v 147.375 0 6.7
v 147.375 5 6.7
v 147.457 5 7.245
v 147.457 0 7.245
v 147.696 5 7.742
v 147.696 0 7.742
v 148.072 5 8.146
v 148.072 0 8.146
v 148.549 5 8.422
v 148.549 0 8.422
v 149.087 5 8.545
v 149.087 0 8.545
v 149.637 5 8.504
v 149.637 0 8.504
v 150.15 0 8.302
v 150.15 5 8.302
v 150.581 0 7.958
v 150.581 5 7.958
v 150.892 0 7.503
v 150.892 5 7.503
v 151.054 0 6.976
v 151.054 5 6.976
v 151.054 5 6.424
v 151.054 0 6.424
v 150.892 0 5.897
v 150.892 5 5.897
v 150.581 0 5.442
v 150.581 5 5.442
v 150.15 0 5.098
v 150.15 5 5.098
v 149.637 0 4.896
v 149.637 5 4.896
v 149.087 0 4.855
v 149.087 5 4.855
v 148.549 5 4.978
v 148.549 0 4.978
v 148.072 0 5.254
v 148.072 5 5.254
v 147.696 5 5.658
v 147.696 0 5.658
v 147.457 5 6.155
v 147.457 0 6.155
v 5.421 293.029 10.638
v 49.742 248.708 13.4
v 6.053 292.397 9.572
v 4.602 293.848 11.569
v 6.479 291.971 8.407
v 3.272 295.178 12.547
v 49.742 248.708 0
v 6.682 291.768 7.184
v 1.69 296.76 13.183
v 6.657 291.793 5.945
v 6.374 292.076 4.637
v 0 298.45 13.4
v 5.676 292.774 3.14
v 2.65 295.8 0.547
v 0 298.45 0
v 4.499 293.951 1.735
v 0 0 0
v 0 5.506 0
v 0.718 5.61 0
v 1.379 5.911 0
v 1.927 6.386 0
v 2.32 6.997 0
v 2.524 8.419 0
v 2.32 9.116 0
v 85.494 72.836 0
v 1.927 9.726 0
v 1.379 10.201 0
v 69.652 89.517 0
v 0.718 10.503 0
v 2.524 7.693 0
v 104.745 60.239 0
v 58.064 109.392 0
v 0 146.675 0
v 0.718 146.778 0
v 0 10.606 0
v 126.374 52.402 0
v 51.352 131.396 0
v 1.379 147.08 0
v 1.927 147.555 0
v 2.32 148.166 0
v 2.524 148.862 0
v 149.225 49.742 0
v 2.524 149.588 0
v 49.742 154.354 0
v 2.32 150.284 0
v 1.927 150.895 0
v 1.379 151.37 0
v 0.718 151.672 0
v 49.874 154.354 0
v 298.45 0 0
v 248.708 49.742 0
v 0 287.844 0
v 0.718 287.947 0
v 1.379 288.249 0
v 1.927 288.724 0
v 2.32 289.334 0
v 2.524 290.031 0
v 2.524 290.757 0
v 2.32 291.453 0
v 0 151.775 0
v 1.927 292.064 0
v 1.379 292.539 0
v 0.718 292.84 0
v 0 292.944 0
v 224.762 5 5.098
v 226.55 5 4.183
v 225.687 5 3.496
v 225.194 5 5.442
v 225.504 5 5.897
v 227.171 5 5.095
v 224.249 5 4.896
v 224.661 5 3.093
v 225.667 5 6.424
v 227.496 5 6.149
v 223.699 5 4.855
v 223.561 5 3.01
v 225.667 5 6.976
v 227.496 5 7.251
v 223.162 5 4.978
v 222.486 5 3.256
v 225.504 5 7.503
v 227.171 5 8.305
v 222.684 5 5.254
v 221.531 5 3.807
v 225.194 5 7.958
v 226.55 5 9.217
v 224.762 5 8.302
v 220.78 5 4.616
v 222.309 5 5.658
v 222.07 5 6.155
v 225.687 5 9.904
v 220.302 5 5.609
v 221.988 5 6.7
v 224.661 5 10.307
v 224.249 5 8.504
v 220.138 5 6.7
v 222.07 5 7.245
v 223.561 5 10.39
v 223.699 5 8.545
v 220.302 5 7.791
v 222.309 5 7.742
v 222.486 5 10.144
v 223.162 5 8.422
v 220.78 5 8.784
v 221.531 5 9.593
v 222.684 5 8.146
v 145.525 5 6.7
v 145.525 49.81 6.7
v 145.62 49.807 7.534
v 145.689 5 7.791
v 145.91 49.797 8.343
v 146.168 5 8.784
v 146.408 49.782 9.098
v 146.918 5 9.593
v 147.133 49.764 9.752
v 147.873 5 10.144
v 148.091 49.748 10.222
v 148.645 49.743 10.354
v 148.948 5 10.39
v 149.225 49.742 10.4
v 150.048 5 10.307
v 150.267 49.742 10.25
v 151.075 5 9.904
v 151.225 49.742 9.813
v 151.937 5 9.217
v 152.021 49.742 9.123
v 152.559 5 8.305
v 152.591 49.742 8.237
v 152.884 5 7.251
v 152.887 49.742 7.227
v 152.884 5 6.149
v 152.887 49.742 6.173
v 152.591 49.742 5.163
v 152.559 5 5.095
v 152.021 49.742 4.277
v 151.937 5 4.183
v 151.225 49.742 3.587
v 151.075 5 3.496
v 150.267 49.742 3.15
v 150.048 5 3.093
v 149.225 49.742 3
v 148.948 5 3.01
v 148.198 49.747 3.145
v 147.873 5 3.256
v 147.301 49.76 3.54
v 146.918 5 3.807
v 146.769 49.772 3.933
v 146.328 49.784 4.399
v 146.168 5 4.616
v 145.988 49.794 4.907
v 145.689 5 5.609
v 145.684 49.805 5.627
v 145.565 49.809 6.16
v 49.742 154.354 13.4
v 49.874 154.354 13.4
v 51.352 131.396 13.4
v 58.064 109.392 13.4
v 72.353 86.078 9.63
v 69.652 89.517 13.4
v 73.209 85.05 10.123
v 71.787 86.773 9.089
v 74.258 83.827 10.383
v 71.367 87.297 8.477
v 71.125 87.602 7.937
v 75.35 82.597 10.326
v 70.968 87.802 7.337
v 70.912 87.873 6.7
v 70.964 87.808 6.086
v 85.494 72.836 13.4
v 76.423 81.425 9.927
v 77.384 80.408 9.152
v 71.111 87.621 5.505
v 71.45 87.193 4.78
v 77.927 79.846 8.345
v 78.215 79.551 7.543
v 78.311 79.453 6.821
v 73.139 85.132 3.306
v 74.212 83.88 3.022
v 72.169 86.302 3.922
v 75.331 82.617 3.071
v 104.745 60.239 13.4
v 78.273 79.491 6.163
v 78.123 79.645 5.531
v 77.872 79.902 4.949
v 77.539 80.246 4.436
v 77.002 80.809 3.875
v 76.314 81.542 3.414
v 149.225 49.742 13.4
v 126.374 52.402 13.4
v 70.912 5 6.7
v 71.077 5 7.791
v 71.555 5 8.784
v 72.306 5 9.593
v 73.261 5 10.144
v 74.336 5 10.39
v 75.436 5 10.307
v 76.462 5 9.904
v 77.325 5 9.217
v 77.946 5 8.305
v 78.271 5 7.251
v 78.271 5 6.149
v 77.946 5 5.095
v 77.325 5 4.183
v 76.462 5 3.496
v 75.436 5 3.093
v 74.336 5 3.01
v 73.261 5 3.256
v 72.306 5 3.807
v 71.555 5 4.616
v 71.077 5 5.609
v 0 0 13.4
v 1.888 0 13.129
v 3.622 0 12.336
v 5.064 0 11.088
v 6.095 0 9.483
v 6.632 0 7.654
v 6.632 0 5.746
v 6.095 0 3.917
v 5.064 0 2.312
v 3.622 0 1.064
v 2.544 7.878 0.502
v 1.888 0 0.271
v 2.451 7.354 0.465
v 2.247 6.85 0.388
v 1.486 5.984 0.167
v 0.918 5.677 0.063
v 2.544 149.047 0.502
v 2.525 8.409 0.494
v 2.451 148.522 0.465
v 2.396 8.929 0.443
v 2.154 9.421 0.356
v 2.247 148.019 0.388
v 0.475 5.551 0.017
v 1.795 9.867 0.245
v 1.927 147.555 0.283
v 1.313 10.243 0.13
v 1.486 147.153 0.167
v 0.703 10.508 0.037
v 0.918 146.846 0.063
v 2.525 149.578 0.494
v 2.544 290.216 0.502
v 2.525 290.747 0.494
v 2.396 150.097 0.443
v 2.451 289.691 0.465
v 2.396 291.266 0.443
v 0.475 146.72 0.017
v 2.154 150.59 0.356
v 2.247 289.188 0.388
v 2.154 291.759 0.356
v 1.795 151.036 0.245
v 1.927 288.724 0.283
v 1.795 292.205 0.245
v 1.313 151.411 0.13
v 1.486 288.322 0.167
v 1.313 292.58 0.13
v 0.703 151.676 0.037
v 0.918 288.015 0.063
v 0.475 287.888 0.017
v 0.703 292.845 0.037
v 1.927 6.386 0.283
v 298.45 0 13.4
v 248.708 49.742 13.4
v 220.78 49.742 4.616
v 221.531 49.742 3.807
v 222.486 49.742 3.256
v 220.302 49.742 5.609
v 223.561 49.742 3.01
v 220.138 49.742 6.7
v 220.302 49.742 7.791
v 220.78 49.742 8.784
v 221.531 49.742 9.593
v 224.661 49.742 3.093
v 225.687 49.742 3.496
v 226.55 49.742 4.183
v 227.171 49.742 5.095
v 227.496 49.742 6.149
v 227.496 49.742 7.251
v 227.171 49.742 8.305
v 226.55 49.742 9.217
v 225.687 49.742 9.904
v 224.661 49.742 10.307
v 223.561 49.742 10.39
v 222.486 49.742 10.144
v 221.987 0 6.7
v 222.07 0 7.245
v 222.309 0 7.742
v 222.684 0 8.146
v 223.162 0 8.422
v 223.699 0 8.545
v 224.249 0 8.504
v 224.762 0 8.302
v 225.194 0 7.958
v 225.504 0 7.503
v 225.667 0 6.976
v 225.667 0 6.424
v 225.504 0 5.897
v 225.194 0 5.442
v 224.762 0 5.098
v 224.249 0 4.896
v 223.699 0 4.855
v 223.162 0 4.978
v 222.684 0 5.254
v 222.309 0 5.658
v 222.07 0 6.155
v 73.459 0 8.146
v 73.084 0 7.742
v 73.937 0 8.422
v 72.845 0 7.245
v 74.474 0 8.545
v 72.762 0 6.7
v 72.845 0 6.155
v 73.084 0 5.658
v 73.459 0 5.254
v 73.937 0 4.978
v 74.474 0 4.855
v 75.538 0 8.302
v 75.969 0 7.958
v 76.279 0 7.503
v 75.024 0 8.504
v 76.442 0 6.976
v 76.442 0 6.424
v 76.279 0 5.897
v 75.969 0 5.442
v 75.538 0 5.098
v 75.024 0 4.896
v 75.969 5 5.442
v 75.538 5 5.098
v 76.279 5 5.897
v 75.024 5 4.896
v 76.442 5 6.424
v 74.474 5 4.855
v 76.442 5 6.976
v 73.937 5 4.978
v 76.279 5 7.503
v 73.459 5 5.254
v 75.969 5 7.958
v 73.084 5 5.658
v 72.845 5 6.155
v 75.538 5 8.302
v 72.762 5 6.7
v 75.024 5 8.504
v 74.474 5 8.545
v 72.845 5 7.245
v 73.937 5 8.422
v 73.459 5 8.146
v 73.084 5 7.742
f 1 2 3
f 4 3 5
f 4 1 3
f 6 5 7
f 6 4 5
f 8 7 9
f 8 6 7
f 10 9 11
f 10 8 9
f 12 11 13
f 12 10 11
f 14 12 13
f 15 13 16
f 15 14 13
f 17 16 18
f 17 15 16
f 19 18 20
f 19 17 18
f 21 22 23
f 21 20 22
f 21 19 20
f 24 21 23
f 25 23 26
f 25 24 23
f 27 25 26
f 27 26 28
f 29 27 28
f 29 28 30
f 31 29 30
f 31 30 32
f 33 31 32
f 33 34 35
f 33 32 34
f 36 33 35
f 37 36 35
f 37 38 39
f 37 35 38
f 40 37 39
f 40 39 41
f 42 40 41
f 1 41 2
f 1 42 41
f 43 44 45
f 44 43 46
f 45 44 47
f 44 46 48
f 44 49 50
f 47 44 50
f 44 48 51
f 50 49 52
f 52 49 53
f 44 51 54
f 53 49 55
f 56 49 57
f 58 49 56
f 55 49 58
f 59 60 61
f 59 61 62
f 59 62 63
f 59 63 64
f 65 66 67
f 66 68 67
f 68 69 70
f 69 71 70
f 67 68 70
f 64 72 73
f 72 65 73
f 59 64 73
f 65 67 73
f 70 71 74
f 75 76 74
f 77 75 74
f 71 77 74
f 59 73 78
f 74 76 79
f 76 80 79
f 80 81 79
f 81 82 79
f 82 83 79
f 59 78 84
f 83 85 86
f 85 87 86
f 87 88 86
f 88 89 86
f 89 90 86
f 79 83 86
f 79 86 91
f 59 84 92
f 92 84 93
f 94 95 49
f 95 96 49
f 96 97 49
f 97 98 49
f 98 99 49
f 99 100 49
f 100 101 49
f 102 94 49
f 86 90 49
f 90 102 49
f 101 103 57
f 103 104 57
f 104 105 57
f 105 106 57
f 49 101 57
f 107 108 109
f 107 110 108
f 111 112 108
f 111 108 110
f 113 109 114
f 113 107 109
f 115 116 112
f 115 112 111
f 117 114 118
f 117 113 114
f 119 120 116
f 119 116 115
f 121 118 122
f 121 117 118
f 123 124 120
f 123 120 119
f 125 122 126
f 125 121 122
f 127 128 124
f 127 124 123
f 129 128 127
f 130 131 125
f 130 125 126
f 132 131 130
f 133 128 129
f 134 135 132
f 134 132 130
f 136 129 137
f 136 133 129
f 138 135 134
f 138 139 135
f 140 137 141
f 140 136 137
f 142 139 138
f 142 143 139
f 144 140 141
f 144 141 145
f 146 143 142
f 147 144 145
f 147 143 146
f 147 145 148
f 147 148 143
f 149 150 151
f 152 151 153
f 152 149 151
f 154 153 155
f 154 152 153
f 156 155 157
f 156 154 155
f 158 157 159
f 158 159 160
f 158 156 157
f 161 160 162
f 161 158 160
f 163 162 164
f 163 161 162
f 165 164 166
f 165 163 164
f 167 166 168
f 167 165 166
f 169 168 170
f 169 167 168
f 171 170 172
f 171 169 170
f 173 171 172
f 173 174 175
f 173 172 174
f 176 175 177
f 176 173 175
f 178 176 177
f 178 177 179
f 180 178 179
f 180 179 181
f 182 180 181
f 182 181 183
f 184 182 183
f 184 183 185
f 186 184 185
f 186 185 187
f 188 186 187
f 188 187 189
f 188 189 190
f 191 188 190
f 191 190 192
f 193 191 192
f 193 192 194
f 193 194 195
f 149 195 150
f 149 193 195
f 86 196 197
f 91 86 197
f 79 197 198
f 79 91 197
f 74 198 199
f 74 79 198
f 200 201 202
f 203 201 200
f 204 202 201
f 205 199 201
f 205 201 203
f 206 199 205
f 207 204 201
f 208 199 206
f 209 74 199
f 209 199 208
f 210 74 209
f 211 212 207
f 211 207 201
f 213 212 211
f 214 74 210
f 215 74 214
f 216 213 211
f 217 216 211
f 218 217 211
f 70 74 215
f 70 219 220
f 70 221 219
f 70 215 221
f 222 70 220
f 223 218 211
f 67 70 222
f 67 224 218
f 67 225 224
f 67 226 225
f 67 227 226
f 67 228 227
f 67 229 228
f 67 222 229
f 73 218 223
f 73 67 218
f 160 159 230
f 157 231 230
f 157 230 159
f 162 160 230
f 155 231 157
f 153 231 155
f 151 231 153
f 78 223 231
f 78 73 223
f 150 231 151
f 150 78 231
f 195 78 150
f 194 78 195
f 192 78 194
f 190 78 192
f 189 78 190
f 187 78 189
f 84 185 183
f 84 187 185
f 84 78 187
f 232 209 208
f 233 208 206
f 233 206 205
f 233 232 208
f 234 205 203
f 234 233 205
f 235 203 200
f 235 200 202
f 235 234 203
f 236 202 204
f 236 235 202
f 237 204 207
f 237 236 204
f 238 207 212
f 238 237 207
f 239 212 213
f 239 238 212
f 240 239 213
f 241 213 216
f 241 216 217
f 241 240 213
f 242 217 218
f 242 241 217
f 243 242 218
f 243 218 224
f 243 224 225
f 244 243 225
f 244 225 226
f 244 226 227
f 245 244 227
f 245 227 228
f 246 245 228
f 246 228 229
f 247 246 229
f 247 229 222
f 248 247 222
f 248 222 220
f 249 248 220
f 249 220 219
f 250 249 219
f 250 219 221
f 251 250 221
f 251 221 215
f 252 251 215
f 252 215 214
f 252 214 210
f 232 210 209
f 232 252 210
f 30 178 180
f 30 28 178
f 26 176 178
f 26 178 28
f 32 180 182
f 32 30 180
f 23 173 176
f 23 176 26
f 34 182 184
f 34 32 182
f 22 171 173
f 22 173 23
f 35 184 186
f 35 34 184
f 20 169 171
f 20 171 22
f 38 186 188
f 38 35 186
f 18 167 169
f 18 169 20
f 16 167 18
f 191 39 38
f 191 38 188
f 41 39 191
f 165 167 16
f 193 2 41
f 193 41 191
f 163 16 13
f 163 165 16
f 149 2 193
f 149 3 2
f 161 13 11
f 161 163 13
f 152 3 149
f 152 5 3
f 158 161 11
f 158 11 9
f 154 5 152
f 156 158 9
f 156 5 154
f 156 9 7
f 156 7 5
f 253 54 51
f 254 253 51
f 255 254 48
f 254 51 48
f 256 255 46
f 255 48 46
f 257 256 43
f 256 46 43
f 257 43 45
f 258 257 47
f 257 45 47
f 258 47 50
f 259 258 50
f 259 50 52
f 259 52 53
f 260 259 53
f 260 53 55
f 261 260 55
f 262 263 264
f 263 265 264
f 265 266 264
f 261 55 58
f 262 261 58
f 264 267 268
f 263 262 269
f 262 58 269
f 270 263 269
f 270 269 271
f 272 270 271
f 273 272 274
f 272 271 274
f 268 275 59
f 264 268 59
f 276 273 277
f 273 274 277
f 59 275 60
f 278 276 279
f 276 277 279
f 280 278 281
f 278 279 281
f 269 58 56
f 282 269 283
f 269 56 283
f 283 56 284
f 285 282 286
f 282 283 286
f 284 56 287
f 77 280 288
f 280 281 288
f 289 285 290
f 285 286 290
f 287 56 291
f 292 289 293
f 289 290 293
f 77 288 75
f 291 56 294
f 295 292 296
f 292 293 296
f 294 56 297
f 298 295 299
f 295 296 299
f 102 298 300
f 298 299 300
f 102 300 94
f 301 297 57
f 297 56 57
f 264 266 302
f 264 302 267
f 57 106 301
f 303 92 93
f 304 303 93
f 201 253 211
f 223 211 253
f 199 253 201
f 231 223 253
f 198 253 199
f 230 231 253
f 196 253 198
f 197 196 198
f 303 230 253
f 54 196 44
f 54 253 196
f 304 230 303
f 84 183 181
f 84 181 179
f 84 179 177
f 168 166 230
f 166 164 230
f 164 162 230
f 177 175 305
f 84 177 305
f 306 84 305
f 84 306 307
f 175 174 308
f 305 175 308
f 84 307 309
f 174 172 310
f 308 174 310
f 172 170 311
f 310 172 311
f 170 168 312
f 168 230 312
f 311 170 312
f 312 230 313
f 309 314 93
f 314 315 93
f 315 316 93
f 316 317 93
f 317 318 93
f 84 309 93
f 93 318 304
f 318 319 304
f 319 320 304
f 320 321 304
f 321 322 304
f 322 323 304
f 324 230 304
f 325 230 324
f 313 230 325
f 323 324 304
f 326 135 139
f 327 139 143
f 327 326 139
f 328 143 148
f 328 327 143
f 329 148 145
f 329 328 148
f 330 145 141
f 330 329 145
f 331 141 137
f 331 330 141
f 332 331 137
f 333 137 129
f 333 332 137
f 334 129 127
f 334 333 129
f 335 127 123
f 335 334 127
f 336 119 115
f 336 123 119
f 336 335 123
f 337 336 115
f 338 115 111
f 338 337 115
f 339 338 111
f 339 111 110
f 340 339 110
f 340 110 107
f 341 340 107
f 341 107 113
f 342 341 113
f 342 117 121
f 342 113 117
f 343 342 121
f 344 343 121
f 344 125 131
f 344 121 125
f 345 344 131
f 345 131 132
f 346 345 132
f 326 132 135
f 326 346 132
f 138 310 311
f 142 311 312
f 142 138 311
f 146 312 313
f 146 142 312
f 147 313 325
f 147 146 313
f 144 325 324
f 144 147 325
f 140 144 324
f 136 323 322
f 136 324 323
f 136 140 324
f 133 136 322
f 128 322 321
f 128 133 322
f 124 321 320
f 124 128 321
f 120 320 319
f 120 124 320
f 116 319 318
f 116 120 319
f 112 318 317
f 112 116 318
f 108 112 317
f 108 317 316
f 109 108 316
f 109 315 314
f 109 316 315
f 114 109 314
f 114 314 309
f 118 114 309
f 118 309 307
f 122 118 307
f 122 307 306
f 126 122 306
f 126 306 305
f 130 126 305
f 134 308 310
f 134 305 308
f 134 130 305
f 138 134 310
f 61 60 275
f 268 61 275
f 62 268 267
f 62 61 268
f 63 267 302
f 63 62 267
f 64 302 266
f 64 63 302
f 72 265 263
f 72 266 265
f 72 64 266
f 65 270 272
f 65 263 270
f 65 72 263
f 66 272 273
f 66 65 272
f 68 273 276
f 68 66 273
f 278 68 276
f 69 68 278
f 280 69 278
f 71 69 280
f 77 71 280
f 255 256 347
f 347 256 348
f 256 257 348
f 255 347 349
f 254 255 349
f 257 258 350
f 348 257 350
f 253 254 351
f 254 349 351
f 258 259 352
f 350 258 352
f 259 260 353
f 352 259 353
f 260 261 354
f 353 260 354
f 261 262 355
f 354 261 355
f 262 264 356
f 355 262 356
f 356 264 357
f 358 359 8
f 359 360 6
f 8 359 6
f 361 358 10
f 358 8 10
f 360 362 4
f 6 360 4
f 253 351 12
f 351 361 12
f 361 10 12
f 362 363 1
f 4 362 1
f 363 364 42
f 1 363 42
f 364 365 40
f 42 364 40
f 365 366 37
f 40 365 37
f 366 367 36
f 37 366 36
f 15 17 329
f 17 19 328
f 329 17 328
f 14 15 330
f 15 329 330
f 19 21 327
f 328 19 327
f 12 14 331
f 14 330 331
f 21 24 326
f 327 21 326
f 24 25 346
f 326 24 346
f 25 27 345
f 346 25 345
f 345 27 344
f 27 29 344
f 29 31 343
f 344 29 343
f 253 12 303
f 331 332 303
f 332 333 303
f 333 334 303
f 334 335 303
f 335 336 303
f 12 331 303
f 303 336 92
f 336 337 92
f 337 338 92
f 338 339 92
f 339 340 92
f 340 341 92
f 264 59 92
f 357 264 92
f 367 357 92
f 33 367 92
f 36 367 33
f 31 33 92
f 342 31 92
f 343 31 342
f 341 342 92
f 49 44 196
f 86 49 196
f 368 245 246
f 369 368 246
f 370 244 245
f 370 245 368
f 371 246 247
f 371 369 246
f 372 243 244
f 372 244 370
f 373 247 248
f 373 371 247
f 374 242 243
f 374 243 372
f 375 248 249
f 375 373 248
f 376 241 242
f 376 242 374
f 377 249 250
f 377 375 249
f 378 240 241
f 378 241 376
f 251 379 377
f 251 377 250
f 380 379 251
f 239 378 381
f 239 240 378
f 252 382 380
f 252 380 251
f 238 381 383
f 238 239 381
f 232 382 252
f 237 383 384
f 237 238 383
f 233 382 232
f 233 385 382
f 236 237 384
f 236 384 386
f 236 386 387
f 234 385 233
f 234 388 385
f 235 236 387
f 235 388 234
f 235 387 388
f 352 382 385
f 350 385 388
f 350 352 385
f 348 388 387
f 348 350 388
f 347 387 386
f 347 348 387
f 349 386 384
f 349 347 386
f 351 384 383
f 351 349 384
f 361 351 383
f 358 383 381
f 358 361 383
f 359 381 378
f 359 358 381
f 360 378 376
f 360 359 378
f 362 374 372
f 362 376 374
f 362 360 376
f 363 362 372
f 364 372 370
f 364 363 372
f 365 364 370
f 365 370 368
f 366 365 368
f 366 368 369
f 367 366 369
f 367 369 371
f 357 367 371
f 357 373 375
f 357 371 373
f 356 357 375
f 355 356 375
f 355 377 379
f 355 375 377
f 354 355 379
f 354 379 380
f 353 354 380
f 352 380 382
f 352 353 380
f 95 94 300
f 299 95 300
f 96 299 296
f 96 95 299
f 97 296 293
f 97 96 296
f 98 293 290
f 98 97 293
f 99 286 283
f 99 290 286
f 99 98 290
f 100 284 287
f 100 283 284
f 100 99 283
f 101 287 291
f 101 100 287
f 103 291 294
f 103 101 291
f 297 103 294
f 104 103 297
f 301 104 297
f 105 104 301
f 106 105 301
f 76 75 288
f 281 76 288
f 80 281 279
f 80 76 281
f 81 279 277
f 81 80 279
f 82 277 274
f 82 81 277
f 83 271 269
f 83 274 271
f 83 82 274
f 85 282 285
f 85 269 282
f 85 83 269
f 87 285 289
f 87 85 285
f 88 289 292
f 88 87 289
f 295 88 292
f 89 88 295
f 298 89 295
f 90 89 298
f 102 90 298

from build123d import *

# Parameters (mm, degrees)
PAD_DEPTH              = 13.4
CYLINDER_W             = 6.7
CYLINDER_H             = 298.45
CYLINDER_ANGLE         = 180
CYLINDER001_R          = 99.483333
CYLINDER001_DEPTH      = 32
BOX_W                  = 149.225
BOX_H                  = 30
BOX_DEPTH              = 21
BOX001_W               = 33
BOX001_H               = 149.225
BOX001_DEPTH           = 22
CYLINDER002_R          = 3.7
CYLINDER002_DEPTH      = 105
LINEARPATTERN_COUNT    = 3
LINEARPATTERN_PITCH    = 74.6125
CYLINDER003_R          = 1.85
CYLINDER003_DEPTH      = 100
LINEARPATTERN001_COUNT = 3
LINEARPATTERN001_PITCH = 74.6125
CYLINDER004_R          = 2.55
CYLINDER004_DEPTH      = 10
LINEARPATTERN002_COUNT = 3
LINEARPATTERN002_PITCH = 141.16875


with BuildPart() as part:
    # Sketch → Pad (new body)
    with BuildSketch(Plane.XY):
        Polygon((0, 0), (298.45, 0), (0, 298.45), align=None)
    extrude(amount=PAD_DEPTH)

    # Cylinder → Cylinder (revolve, cut)
    with BuildSketch(Plane(origin=(0, 0, 6.7), x_dir=(0, 0, 1), z_dir=(-1, 0, 0))):
        with Locations((3.35, 149.225)):
            Rectangle(CYLINDER_W, CYLINDER_H)
    revolve(axis=Axis((0, 0, 6.7), (0, 1, 0)), revolution_arc=CYLINDER_ANGLE, mode=Mode.SUBTRACT)

    # Cylinder001 → Cylinder001 (cut)
    with BuildSketch(Plane(origin=(149.225, 149.225, -8), x_dir=(1, 0, 0), z_dir=(0, 0, 1))):
        Circle(CYLINDER001_R)
    extrude(amount=CYLINDER001_DEPTH, mode=Mode.SUBTRACT)

    # Box → Box (cut)
    with BuildSketch(Plane(origin=(149.225, 79.741667, 17), x_dir=(1, 0, 0), z_dir=(0, 0, -1))):
        with Locations((74.6125, 15)):
            Rectangle(BOX_W, BOX_H)
    extrude(amount=BOX_DEPTH, mode=Mode.SUBTRACT)

    # Box001 → Box001 (cut)
    with BuildSketch(Plane(origin=(49.741667, 303.579167, 17), x_dir=(1, 0, 0), z_dir=(0, 0, -1))):
        with Locations((16.5, 74.6125)):
            Rectangle(BOX001_W, BOX001_H)
    extrude(amount=BOX001_DEPTH, mode=Mode.SUBTRACT)

    # Cylinder002 → Cylinder002 (cut)
    with BuildSketch(Plane(origin=(74.6125, 5, 6.7), x_dir=(-1, 0, 0), z_dir=(0, 1, 0))):
        Circle(CYLINDER002_R)
    cylinder002 = extrude(amount=CYLINDER002_DEPTH, mode=Mode.SUBTRACT)

    # LinearPattern: Cylinder002 ×3
    with Locations(*[(i * LINEARPATTERN_PITCH, 0, 0) for i in range(1, LINEARPATTERN_COUNT)]):
        add(cylinder002, mode=Mode.SUBTRACT)

    # Cylinder003 → Cylinder003 (cut)
    with BuildSketch(Plane(origin=(74.6125, 0, 6.7), x_dir=(-1, 0, 0), z_dir=(0, 1, 0))):
        Circle(CYLINDER003_R)
    cylinder003 = extrude(amount=CYLINDER003_DEPTH, mode=Mode.SUBTRACT)

    # LinearPattern001: Cylinder003 ×3
    with Locations(*[(i * LINEARPATTERN001_PITCH, 0, 0) for i in range(1, LINEARPATTERN001_COUNT)]):
        add(cylinder003, mode=Mode.SUBTRACT)

    # Cylinder004 → Cylinder004 (cut)
    with BuildSketch(Plane(origin=(0, 8.05625, 0), x_dir=(1, 0, 0), z_dir=(0, 0, 1))):
        Circle(CYLINDER004_R)
    cylinder004 = extrude(amount=CYLINDER004_DEPTH, mode=Mode.SUBTRACT)

    # LinearPattern002: Cylinder004 ×3
    with Locations(*[(0, i * LINEARPATTERN002_PITCH, 0) for i in range(1, LINEARPATTERN002_COUNT)]):
        add(cylinder004, mode=Mode.SUBTRACT)


solid = part.part
